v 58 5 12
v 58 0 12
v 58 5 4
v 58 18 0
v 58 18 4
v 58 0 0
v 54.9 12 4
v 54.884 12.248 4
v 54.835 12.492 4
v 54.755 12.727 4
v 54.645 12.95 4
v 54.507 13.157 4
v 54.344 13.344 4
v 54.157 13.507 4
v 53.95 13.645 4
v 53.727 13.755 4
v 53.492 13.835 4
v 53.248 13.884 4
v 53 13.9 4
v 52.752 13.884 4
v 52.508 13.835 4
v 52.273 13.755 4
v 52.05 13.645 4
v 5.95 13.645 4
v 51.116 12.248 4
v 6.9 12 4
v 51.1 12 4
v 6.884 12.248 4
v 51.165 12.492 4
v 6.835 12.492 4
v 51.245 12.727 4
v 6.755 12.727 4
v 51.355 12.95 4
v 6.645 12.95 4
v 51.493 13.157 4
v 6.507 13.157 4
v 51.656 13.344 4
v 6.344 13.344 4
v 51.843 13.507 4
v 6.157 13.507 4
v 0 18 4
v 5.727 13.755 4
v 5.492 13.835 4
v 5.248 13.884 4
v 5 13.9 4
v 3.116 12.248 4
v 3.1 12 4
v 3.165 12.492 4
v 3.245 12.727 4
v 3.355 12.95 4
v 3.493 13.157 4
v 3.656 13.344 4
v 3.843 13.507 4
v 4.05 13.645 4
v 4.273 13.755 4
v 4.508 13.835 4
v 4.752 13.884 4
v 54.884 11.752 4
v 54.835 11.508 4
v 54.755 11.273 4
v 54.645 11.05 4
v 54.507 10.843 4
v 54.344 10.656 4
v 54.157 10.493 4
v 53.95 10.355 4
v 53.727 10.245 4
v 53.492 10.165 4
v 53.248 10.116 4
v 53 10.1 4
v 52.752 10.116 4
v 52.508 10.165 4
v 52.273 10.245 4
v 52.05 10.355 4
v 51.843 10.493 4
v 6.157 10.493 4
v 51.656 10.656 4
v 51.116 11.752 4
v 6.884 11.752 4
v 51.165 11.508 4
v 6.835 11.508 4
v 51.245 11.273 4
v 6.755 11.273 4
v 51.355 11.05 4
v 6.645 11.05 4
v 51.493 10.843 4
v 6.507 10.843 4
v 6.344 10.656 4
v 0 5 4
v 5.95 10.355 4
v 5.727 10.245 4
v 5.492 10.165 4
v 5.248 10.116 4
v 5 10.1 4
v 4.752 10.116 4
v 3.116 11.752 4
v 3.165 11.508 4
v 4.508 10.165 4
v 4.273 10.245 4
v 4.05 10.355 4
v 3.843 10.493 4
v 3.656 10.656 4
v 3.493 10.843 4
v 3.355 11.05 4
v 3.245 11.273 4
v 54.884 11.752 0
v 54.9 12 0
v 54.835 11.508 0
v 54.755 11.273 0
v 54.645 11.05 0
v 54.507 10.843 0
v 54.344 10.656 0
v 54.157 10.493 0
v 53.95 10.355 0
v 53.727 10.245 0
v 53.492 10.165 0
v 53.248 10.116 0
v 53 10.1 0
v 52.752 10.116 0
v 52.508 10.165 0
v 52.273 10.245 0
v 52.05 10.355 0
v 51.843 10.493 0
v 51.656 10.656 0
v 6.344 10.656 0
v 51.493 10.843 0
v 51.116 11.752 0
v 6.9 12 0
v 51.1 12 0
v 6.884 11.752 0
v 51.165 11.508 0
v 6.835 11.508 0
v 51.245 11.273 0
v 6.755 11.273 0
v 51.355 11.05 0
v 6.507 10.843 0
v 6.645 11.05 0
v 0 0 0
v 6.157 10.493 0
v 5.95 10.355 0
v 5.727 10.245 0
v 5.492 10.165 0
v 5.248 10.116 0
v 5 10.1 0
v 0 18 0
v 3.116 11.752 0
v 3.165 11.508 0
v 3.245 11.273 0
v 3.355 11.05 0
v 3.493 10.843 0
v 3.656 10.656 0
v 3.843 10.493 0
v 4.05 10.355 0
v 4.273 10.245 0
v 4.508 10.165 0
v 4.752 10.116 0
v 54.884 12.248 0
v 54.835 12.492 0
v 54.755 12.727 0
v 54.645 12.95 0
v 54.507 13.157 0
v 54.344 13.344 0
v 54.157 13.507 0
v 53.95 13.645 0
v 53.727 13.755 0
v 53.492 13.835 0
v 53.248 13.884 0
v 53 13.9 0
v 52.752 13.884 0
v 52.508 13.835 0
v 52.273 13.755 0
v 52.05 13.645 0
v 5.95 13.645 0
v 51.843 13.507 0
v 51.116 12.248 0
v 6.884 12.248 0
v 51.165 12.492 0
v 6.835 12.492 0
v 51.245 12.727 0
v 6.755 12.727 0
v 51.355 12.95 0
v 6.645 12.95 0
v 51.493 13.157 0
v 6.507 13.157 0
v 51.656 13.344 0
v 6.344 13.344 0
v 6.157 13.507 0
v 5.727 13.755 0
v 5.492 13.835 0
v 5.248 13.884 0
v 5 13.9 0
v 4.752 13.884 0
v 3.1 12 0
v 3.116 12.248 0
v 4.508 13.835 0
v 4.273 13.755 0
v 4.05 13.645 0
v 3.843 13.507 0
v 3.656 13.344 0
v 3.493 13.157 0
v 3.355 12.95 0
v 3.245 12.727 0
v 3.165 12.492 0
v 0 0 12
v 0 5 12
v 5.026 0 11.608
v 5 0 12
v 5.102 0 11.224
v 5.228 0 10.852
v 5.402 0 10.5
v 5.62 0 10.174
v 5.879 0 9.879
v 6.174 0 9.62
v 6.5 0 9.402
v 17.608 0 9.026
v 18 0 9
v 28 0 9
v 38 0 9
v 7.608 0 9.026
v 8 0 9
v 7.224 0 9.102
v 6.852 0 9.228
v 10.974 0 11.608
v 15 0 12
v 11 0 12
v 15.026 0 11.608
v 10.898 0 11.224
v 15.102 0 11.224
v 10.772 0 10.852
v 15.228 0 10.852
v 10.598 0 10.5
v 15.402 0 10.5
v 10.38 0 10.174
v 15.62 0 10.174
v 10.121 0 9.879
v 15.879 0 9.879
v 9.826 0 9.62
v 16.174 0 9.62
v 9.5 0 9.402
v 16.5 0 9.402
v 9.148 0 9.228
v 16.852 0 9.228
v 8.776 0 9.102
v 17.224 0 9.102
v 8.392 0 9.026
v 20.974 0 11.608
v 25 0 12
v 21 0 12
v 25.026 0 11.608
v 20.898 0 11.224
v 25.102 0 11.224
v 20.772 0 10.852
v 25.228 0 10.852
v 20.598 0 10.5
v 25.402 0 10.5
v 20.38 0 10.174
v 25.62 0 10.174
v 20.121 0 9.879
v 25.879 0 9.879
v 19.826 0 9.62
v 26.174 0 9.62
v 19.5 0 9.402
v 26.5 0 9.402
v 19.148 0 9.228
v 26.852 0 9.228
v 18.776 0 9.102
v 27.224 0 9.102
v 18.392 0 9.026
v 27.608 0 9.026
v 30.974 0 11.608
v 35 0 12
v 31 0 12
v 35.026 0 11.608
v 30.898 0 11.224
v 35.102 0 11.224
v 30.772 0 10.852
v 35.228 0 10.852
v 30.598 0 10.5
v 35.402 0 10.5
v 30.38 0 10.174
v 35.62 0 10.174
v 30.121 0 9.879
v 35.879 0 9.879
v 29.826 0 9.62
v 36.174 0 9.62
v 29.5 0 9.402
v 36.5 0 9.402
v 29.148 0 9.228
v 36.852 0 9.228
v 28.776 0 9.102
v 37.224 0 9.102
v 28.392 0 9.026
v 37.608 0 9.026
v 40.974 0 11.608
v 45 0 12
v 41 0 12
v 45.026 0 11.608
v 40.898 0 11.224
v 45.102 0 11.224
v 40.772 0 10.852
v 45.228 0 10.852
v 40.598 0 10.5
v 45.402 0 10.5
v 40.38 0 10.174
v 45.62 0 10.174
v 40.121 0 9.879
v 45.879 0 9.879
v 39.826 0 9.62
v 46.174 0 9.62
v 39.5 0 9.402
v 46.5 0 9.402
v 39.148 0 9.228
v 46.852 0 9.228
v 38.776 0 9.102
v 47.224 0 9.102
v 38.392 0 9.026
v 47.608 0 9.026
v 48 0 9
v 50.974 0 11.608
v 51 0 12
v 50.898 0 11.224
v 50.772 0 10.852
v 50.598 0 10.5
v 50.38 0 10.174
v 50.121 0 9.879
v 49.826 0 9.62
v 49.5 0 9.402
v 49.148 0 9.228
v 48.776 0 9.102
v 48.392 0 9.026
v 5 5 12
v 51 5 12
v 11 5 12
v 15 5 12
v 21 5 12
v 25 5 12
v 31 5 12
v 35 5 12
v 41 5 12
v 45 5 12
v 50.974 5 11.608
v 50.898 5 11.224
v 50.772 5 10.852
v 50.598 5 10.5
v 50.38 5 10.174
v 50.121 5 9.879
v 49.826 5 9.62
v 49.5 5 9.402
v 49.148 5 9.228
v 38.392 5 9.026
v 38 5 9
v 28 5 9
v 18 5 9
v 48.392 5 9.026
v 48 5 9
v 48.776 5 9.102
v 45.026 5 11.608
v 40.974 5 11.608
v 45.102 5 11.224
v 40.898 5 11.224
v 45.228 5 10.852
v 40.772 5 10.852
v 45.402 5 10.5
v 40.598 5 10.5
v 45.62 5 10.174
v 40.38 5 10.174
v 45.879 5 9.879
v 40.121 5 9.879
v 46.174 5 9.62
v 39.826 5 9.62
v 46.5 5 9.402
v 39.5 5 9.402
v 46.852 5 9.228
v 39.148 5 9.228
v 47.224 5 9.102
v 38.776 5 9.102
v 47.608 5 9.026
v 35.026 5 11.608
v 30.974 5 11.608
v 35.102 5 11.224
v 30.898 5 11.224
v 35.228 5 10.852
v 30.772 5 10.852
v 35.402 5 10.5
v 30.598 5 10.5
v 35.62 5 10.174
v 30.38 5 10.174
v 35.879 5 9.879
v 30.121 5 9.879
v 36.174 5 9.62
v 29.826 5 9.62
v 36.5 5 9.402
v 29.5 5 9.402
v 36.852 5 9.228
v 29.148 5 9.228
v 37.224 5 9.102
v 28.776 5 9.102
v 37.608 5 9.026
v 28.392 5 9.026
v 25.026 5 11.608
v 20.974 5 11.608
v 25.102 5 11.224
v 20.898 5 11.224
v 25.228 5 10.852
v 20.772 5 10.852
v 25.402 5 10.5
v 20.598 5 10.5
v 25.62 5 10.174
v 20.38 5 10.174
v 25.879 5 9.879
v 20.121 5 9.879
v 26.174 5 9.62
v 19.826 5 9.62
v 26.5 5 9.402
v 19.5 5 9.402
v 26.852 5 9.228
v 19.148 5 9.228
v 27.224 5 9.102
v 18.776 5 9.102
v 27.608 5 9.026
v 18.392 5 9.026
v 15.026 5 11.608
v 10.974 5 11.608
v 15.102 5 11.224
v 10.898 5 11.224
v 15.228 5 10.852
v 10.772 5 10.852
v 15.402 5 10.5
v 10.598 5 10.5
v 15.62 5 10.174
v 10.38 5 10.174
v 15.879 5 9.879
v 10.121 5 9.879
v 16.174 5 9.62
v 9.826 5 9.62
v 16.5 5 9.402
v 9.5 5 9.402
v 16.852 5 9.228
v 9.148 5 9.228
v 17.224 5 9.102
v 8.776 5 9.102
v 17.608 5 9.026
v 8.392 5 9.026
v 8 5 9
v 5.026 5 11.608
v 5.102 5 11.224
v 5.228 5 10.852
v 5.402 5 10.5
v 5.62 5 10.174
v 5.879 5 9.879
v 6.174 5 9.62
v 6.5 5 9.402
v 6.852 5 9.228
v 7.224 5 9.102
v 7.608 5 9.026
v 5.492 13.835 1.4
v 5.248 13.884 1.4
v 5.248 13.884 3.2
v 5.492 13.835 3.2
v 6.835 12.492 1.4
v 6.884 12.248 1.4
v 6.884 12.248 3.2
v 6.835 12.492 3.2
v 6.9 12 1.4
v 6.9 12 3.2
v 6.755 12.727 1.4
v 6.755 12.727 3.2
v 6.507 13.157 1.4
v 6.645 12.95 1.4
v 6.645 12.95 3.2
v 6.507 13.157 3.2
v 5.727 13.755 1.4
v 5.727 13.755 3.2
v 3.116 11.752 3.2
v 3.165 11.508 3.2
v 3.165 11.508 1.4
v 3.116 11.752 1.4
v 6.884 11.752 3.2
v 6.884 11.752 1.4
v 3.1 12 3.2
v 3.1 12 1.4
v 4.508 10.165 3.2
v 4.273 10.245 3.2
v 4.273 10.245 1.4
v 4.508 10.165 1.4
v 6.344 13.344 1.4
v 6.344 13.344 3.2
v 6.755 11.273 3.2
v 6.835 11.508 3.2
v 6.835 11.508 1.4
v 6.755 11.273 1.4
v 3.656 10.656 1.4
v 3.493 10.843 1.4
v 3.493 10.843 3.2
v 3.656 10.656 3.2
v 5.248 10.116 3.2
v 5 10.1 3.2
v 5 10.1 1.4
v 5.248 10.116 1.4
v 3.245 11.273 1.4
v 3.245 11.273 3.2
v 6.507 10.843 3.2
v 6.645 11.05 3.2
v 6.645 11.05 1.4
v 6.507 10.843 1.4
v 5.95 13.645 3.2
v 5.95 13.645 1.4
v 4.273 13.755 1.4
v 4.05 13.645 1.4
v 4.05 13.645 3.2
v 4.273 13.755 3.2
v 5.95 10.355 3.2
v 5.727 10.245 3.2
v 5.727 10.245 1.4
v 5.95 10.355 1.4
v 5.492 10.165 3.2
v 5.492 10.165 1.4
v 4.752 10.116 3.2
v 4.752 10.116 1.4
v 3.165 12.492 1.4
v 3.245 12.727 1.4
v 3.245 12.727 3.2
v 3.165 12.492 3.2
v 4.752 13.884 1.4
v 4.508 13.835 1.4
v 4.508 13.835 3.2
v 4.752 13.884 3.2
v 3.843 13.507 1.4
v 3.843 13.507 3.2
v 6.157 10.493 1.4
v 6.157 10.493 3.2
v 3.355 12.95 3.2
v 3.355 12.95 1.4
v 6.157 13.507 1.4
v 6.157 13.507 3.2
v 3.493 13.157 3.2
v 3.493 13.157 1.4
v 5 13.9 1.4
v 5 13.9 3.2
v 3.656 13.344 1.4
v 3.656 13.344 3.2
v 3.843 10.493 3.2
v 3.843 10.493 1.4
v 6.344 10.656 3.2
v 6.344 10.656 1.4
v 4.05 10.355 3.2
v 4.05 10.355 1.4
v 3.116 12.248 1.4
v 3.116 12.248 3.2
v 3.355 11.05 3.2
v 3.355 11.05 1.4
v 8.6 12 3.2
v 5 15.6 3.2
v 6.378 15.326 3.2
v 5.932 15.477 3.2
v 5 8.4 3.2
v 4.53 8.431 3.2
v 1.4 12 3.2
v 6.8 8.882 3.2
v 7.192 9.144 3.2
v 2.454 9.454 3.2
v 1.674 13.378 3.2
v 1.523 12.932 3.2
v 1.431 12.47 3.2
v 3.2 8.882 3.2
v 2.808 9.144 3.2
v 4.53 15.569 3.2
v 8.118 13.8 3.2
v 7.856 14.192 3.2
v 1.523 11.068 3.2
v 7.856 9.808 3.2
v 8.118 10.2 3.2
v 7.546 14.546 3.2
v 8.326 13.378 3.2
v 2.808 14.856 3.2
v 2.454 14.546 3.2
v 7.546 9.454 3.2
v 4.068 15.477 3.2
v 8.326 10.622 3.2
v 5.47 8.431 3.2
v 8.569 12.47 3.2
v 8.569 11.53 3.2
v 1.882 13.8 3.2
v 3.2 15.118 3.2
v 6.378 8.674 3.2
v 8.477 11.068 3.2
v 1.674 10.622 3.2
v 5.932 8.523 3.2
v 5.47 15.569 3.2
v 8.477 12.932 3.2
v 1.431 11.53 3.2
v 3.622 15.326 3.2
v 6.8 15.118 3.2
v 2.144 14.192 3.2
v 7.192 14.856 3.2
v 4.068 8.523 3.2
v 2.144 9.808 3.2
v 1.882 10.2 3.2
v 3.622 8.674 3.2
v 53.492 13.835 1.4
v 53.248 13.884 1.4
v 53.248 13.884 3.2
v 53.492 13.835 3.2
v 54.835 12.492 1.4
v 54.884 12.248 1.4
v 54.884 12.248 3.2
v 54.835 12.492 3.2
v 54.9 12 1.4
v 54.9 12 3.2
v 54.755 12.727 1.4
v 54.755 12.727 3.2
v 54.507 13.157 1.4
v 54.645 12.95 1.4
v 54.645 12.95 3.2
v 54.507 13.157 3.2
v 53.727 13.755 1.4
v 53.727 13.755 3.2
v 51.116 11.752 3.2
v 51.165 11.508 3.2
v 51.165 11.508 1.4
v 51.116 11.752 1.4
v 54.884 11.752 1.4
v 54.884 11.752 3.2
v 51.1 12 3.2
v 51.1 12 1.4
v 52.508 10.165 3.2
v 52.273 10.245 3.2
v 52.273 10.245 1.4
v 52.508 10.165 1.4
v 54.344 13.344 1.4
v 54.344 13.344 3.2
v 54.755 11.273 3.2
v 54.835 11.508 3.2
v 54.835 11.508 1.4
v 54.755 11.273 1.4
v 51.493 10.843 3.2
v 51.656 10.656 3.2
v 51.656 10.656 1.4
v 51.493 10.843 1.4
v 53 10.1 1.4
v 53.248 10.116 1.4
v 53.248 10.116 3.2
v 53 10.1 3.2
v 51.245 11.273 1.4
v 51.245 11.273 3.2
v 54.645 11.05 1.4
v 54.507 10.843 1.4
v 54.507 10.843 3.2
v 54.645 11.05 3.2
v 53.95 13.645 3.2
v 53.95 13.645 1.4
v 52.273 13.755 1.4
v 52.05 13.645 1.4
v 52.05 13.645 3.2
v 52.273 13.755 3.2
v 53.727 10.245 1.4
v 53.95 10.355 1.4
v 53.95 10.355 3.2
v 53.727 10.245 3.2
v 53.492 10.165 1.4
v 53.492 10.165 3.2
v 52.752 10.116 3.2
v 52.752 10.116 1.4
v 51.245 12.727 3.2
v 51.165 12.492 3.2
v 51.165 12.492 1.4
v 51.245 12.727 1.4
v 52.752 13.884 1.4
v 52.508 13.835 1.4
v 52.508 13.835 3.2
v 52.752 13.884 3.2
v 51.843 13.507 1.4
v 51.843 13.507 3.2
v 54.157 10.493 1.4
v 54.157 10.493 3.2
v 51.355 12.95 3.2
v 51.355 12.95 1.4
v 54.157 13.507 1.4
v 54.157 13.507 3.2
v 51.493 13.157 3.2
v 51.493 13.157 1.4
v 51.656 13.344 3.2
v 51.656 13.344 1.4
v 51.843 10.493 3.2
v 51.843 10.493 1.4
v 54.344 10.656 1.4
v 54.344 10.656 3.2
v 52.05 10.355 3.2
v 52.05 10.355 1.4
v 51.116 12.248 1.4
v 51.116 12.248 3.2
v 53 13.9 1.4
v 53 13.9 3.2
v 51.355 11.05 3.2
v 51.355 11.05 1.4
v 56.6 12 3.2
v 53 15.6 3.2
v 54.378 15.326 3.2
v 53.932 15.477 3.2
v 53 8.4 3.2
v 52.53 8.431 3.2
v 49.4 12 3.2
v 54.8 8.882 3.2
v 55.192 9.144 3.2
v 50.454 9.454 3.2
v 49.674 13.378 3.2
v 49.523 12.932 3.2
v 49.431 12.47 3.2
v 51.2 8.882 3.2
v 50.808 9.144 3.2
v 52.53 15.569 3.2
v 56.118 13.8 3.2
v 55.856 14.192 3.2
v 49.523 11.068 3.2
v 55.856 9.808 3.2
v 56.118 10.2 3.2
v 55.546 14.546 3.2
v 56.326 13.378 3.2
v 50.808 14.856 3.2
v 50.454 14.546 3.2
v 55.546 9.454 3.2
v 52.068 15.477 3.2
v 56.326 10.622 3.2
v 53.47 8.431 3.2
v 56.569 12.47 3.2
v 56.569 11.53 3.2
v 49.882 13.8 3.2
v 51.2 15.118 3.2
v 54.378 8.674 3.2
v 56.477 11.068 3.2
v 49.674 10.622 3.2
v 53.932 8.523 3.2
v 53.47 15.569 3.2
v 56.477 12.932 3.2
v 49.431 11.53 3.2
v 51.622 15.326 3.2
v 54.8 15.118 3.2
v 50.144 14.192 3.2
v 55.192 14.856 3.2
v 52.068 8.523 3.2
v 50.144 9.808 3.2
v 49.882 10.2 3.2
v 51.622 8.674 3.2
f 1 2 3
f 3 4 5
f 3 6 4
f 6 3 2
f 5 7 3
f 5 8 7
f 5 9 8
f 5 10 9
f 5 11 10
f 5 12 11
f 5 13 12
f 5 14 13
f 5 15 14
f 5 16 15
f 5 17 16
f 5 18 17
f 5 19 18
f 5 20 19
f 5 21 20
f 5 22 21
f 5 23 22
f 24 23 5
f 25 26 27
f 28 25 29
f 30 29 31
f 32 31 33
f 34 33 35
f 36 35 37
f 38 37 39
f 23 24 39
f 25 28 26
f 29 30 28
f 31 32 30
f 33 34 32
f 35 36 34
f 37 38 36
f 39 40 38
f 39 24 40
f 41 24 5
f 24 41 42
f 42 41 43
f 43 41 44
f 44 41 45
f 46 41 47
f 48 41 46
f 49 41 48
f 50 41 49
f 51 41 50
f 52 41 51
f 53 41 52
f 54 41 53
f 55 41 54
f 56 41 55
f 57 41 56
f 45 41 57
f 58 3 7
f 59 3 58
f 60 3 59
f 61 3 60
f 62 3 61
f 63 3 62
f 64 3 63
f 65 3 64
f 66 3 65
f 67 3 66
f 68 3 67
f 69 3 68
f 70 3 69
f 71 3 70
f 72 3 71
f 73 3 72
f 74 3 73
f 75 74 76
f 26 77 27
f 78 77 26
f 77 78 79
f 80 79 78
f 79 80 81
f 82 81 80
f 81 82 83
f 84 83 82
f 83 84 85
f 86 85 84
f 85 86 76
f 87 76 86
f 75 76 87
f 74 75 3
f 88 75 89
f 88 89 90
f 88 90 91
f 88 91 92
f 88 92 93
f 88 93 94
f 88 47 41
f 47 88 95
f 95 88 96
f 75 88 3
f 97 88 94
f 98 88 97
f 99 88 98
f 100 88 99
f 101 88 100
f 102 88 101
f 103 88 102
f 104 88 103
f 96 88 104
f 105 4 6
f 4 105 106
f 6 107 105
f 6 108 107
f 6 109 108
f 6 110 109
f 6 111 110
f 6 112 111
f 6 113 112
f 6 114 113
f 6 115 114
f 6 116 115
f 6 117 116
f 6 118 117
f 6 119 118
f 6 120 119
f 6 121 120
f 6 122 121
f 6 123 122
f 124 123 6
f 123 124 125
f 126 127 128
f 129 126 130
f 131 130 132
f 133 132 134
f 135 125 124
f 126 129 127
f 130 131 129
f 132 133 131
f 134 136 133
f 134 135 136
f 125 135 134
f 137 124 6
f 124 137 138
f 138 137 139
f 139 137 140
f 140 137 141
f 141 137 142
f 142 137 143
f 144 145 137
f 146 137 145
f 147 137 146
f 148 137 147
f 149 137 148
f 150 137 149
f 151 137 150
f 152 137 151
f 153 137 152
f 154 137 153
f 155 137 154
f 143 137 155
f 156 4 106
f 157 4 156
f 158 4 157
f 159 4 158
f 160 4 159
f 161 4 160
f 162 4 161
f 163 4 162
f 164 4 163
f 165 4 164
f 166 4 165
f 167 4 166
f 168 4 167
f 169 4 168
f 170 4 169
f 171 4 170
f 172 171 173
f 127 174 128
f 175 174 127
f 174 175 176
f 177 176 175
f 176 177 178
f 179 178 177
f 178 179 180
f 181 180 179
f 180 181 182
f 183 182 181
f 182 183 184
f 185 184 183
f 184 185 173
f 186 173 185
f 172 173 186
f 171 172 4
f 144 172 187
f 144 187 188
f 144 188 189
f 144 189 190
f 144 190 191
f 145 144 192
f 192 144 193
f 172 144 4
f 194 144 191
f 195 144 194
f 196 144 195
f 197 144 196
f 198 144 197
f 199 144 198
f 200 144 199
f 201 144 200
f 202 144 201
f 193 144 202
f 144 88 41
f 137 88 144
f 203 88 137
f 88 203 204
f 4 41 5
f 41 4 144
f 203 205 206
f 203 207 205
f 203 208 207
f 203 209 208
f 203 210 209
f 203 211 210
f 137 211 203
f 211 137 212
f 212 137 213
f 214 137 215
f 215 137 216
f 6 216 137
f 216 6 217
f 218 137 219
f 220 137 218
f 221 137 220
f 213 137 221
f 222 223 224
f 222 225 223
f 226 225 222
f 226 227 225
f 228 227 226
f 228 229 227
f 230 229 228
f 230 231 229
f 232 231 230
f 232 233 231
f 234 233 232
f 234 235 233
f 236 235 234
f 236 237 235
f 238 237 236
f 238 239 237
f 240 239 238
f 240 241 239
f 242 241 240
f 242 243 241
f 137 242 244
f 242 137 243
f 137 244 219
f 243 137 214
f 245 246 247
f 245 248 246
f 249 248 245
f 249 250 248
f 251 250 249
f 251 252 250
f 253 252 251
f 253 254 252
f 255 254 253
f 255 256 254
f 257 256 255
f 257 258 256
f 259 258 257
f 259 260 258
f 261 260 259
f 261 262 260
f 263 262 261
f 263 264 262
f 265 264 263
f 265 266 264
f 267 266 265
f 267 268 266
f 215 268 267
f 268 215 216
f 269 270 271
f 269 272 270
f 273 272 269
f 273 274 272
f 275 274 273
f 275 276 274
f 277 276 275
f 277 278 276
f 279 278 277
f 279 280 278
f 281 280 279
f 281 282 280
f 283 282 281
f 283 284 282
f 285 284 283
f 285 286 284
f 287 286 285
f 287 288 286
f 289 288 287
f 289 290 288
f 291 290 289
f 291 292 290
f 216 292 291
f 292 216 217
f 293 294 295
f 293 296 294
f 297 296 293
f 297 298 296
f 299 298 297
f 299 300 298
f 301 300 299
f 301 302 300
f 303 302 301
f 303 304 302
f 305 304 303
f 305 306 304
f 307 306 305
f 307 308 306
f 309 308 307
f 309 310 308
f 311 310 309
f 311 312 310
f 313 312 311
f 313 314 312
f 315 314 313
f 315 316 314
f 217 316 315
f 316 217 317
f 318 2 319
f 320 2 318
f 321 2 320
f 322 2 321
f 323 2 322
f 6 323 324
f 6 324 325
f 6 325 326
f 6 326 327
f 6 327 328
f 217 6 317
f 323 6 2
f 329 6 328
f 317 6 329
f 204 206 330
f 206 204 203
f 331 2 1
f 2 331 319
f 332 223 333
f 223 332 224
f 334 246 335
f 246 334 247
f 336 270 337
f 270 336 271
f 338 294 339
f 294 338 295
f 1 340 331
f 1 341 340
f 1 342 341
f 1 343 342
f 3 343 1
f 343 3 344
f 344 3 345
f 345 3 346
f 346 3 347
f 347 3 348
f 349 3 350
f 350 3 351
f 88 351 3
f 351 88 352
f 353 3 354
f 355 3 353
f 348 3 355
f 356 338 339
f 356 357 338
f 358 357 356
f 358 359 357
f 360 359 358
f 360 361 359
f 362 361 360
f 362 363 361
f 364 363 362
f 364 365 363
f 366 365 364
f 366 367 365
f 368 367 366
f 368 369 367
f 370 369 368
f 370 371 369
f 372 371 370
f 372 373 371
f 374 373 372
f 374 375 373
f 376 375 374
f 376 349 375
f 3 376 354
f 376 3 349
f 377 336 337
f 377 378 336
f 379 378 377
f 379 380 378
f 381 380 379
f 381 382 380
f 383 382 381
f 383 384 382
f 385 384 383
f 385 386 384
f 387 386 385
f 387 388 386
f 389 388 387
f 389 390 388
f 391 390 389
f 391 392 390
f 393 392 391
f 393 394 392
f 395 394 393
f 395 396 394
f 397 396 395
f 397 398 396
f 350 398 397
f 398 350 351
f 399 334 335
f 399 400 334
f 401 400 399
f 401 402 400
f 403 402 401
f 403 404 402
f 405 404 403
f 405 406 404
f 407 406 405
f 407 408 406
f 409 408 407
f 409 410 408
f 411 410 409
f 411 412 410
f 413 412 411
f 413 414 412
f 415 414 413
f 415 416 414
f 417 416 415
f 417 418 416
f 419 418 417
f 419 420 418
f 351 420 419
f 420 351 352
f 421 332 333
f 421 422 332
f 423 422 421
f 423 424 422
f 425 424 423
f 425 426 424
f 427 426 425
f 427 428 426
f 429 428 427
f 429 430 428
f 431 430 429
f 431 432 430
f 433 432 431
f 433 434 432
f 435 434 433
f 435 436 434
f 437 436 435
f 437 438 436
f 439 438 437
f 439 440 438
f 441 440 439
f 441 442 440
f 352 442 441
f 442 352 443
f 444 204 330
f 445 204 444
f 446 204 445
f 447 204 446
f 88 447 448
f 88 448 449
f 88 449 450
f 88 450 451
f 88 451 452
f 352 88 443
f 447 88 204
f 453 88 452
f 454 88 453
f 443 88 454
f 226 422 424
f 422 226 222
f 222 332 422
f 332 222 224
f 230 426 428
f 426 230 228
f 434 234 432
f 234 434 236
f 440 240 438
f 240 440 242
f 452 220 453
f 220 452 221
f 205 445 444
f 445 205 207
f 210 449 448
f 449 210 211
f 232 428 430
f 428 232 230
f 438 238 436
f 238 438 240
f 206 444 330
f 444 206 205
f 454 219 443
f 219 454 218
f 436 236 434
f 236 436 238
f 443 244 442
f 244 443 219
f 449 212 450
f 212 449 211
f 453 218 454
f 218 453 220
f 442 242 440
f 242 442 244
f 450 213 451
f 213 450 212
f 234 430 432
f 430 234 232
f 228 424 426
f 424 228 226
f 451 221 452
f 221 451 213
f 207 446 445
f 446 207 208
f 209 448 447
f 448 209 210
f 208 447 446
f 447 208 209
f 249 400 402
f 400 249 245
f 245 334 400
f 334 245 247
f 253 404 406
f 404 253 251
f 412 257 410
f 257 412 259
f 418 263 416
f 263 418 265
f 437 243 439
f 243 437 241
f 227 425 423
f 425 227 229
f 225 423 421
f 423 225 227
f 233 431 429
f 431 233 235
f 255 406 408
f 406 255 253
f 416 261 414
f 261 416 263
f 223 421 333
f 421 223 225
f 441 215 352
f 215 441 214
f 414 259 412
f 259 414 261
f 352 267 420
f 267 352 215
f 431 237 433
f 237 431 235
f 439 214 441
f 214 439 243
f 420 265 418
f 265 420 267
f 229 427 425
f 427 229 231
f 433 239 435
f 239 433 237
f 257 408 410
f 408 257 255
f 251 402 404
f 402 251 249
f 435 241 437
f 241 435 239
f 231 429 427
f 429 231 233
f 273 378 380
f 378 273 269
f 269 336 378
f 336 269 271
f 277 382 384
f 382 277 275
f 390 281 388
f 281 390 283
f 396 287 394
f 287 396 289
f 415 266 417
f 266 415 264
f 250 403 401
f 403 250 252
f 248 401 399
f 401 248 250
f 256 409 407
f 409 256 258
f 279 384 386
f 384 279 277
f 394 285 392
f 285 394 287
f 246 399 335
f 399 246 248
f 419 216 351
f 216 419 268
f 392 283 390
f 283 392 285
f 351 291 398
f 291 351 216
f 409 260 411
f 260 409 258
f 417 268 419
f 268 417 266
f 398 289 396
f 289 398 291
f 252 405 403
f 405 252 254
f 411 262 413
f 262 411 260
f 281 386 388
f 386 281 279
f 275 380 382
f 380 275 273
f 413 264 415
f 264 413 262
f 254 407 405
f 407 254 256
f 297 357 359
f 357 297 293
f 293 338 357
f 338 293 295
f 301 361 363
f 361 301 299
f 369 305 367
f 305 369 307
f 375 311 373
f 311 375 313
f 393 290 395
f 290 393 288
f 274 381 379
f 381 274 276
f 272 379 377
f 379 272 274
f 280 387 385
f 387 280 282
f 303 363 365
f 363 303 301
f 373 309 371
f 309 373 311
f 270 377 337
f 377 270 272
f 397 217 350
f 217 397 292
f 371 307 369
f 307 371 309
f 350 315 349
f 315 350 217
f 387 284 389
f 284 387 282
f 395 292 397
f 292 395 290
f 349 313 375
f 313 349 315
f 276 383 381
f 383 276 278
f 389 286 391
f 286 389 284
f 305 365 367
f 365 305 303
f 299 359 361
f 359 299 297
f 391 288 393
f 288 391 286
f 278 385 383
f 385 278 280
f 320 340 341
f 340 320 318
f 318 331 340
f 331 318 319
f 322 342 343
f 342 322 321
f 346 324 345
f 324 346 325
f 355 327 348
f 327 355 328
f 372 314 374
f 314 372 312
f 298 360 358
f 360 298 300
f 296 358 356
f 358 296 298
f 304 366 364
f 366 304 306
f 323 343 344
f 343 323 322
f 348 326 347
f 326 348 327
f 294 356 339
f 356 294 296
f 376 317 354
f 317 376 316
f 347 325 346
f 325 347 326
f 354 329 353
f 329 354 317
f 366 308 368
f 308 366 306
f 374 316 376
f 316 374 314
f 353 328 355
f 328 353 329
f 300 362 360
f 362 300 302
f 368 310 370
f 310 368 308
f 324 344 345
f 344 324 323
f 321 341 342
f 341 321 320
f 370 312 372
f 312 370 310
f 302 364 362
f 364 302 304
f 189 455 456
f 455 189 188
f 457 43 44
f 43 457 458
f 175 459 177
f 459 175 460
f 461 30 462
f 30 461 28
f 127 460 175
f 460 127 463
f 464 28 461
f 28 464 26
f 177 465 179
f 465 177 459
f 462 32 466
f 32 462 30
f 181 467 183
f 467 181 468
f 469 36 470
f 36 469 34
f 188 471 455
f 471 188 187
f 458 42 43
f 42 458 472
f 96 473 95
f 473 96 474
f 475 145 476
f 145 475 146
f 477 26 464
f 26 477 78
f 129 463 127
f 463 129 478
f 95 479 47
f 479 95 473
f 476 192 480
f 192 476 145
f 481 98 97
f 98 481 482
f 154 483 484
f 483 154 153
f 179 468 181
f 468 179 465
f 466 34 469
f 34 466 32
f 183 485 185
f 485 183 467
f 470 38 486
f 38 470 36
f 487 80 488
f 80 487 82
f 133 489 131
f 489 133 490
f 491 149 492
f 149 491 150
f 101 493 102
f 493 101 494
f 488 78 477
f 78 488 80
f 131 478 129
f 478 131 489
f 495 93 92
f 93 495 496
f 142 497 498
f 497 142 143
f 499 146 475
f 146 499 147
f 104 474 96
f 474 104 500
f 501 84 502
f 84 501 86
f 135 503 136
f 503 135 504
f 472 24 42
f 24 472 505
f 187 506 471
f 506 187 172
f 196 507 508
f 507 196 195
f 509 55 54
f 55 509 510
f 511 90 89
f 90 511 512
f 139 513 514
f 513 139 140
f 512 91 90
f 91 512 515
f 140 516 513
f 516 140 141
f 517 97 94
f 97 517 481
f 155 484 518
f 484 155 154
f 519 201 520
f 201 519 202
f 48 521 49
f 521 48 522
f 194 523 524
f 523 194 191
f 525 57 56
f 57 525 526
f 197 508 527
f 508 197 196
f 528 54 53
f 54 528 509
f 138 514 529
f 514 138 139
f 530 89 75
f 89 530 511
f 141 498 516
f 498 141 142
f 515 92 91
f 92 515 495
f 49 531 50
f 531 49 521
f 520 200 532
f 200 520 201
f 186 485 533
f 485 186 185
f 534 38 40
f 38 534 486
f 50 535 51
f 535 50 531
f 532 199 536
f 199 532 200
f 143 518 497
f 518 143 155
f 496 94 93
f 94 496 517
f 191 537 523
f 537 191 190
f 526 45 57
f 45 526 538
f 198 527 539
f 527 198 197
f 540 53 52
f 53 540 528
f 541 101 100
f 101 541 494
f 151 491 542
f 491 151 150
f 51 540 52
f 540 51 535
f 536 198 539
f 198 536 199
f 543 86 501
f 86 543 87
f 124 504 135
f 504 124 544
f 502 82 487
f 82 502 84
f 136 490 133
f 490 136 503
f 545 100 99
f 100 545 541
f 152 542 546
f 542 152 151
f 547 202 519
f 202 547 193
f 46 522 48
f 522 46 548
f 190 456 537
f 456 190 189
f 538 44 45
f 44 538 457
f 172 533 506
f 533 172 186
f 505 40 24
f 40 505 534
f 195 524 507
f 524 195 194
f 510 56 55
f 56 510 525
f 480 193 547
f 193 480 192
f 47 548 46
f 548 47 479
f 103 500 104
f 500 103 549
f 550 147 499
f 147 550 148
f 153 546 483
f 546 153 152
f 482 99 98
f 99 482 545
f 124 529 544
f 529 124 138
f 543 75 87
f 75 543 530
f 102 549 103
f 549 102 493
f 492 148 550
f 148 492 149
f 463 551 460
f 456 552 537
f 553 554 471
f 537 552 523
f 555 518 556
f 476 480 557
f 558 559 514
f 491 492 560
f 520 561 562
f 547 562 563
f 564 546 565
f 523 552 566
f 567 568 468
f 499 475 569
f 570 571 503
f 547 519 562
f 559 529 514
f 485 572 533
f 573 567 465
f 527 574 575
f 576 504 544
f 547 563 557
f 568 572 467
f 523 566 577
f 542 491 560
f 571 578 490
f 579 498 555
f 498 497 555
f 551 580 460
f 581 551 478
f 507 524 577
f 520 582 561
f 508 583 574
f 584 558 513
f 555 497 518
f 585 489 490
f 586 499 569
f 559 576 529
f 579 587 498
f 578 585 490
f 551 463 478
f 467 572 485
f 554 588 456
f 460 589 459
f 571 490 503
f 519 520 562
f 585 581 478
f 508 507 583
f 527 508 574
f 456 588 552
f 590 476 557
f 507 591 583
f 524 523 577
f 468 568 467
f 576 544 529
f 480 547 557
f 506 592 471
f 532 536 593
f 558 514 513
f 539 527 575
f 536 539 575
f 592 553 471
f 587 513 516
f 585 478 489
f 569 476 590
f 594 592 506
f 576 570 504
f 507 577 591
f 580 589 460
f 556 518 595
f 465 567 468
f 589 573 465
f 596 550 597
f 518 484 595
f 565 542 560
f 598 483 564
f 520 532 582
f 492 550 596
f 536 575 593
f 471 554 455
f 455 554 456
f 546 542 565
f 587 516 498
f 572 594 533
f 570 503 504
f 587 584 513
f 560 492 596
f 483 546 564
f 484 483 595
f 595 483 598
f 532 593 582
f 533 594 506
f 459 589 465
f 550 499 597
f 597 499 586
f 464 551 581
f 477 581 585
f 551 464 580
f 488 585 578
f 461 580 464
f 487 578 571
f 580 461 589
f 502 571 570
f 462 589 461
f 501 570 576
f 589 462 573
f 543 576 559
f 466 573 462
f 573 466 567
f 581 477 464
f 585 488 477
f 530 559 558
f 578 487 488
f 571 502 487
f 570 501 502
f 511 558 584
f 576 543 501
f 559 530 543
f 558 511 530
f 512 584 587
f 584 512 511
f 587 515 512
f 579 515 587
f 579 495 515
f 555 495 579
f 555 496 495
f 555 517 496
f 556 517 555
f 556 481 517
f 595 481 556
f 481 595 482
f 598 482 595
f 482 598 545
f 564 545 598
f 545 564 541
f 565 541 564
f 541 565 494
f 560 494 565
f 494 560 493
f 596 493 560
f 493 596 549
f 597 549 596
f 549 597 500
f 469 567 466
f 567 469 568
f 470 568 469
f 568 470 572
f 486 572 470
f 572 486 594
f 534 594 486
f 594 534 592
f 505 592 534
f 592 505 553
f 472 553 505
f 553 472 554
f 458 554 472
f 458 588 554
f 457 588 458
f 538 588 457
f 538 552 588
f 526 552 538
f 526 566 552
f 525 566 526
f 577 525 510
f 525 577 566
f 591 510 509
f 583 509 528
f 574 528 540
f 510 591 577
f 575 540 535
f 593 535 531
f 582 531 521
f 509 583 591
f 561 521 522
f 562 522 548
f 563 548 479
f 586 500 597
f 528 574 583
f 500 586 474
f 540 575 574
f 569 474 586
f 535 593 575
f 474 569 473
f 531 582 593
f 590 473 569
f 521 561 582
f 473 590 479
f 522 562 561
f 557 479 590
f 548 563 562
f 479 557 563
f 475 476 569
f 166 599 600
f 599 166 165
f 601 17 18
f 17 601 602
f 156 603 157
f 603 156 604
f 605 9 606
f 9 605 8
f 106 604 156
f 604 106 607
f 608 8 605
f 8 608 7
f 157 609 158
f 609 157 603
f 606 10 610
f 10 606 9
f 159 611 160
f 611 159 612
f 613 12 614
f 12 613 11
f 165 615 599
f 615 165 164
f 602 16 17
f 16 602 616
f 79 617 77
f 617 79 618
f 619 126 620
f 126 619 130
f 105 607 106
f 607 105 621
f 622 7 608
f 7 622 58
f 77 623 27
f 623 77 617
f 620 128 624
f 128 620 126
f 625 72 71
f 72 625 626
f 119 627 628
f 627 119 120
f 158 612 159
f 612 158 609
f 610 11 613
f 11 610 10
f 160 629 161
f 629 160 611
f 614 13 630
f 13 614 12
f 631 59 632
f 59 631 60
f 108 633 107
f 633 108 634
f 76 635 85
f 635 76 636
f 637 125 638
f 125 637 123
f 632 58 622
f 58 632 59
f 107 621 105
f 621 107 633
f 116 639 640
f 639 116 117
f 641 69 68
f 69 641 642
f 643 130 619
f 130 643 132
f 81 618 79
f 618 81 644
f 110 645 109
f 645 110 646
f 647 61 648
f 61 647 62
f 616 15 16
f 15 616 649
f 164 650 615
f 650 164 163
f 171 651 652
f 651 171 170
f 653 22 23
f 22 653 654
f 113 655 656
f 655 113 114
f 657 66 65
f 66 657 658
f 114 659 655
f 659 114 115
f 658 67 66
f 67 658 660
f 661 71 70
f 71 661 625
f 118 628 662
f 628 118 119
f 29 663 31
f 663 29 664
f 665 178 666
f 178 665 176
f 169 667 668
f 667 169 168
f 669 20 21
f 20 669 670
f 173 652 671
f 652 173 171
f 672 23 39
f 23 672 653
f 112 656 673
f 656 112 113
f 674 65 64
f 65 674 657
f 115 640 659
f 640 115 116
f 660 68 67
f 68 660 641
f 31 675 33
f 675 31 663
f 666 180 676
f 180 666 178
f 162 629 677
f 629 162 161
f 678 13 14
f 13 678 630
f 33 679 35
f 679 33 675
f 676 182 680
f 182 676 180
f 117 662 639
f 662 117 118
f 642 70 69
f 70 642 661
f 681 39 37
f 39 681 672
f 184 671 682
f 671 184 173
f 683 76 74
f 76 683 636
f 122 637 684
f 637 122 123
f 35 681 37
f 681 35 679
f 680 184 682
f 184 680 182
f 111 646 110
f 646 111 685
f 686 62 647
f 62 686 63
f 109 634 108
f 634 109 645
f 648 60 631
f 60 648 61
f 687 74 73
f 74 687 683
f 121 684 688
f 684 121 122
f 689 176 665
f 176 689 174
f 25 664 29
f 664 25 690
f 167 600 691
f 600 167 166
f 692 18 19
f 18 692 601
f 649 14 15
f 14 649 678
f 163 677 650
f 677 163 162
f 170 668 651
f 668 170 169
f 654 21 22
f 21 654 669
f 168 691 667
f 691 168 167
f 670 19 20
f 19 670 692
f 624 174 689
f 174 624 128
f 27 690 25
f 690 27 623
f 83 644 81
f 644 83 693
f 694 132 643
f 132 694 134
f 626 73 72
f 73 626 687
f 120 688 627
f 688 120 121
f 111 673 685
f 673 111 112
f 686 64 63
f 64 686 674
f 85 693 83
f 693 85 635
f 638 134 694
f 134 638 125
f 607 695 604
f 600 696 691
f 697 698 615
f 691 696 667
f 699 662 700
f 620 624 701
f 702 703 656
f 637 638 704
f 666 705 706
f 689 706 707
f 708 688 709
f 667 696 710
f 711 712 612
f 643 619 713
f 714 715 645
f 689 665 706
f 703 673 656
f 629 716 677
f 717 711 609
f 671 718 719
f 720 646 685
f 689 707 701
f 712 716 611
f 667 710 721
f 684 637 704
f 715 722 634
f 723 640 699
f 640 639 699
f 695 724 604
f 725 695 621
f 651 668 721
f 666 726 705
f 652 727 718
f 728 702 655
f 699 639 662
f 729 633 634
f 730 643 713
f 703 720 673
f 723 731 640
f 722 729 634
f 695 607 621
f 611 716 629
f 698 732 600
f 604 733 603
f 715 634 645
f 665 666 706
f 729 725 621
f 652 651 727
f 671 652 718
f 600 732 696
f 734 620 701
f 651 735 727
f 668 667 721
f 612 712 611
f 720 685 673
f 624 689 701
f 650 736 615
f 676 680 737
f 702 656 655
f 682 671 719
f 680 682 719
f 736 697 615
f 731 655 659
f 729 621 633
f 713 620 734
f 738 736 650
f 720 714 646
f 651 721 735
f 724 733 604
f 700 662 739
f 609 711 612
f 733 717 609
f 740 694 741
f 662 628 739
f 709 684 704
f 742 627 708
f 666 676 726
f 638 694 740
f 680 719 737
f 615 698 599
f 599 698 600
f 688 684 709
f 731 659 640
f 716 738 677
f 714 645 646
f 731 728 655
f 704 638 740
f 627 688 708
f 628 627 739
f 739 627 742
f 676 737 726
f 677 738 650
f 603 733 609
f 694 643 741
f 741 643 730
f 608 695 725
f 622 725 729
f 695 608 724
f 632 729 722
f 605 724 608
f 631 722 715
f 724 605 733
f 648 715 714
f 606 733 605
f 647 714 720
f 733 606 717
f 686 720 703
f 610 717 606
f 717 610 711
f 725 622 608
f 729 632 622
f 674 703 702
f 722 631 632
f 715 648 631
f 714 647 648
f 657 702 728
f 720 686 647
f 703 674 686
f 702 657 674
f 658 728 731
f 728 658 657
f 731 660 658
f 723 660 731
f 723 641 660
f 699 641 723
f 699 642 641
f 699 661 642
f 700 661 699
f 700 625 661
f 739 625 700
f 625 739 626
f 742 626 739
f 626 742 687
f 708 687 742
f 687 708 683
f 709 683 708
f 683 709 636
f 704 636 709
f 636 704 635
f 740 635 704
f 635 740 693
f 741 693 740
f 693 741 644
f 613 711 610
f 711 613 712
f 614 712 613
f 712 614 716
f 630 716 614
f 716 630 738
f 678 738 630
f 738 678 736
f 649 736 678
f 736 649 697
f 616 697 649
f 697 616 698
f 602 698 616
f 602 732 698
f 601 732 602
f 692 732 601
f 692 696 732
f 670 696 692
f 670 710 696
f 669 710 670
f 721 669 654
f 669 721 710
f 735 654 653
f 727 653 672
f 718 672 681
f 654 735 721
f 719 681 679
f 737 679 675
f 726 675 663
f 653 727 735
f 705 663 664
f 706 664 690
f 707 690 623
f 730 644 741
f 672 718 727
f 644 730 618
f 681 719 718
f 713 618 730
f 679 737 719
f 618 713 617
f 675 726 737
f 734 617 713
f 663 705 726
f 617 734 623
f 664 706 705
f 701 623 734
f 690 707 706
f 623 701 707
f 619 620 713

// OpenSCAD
// =====================================================================
//  DESK & CABLE ORGANIZER PACK  — print the part you need
//  Set `part`, hit F6, export STL. Units: mm. No supports.
// =====================================================================
part = "cable_comb";   // "cable_comb" | "headphone_hook" | "phone_stand"
$fn = 48;

// ---- 1. Cable comb: drop cables into the U-notches; screws to a desk edge
module cable_comb(slots = 5) {
  L = slots*10 + 8; W = 18; wallH = 12; baseT = 4; wallT = 5;
  difference() {
    union() {
      cube([L, W, baseT]);                 // base
      cube([L, wallT, wallH]);             // upright wall
    }
    // U-notches along the top of the wall
    for (i = [0:slots-1])
      translate([8 + i*10, -1, wallH]) rotate([-90,0,0]) cylinder(h = wallT+2, r = 3);
    // countersunk screw holes in the base
    for (x = [5, L-5]) translate([x, W-6, -1]) {
      cylinder(h = baseT+2, r = 1.9);
      translate([0,0,baseT-1.6]) cylinder(h = 1.8, r1 = 1.9, r2 = 3.6);
    }
  }
}

// ---- 2. Headphone hook: screws under a desk; band rests in the up-turn
module headphone_hook() {
  w = 28;
  pts = [[0,0],[0,42],[6,42],[6,6],[78,6],[78,22],[70,22],[70,0]];
  rotate([90,0,90]) linear_extrude(w) polygon(pts);   // L-profile arm, extruded to width
  // mount screw holes (through the vertical plate)
  for (z = [12, 32]) translate([w/2, 3, z]) rotate([90,0,0]) cylinder(h = 8, r = 2, center=true);
}

// ---- 3. Phone stand: base + back-leaning support + front lip + cable slot
module phone_stand() {
  w = 78; baseT = 6;
  difference() {
    union() {
      cube([w, 90, baseT]);                                  // base
      translate([0, 50, baseT]) rotate([14,0,0]) cube([w, 8, 70]); // support, leans back 14°
      translate([0, 22, baseT]) cube([w, 7, 18]);            // front lip (catches phone's bottom edge)
    }
    // cable pass-through under where the phone sits
    translate([w/2, 40, baseT]) rotate([0,90,0]) cylinder(h = w+2, r = 6, center=true);
  }
}

if (part == "cable_comb")     cable_comb();
else if (part == "headphone_hook") headphone_hook();
else if (part == "phone_stand")    phone_stand();
